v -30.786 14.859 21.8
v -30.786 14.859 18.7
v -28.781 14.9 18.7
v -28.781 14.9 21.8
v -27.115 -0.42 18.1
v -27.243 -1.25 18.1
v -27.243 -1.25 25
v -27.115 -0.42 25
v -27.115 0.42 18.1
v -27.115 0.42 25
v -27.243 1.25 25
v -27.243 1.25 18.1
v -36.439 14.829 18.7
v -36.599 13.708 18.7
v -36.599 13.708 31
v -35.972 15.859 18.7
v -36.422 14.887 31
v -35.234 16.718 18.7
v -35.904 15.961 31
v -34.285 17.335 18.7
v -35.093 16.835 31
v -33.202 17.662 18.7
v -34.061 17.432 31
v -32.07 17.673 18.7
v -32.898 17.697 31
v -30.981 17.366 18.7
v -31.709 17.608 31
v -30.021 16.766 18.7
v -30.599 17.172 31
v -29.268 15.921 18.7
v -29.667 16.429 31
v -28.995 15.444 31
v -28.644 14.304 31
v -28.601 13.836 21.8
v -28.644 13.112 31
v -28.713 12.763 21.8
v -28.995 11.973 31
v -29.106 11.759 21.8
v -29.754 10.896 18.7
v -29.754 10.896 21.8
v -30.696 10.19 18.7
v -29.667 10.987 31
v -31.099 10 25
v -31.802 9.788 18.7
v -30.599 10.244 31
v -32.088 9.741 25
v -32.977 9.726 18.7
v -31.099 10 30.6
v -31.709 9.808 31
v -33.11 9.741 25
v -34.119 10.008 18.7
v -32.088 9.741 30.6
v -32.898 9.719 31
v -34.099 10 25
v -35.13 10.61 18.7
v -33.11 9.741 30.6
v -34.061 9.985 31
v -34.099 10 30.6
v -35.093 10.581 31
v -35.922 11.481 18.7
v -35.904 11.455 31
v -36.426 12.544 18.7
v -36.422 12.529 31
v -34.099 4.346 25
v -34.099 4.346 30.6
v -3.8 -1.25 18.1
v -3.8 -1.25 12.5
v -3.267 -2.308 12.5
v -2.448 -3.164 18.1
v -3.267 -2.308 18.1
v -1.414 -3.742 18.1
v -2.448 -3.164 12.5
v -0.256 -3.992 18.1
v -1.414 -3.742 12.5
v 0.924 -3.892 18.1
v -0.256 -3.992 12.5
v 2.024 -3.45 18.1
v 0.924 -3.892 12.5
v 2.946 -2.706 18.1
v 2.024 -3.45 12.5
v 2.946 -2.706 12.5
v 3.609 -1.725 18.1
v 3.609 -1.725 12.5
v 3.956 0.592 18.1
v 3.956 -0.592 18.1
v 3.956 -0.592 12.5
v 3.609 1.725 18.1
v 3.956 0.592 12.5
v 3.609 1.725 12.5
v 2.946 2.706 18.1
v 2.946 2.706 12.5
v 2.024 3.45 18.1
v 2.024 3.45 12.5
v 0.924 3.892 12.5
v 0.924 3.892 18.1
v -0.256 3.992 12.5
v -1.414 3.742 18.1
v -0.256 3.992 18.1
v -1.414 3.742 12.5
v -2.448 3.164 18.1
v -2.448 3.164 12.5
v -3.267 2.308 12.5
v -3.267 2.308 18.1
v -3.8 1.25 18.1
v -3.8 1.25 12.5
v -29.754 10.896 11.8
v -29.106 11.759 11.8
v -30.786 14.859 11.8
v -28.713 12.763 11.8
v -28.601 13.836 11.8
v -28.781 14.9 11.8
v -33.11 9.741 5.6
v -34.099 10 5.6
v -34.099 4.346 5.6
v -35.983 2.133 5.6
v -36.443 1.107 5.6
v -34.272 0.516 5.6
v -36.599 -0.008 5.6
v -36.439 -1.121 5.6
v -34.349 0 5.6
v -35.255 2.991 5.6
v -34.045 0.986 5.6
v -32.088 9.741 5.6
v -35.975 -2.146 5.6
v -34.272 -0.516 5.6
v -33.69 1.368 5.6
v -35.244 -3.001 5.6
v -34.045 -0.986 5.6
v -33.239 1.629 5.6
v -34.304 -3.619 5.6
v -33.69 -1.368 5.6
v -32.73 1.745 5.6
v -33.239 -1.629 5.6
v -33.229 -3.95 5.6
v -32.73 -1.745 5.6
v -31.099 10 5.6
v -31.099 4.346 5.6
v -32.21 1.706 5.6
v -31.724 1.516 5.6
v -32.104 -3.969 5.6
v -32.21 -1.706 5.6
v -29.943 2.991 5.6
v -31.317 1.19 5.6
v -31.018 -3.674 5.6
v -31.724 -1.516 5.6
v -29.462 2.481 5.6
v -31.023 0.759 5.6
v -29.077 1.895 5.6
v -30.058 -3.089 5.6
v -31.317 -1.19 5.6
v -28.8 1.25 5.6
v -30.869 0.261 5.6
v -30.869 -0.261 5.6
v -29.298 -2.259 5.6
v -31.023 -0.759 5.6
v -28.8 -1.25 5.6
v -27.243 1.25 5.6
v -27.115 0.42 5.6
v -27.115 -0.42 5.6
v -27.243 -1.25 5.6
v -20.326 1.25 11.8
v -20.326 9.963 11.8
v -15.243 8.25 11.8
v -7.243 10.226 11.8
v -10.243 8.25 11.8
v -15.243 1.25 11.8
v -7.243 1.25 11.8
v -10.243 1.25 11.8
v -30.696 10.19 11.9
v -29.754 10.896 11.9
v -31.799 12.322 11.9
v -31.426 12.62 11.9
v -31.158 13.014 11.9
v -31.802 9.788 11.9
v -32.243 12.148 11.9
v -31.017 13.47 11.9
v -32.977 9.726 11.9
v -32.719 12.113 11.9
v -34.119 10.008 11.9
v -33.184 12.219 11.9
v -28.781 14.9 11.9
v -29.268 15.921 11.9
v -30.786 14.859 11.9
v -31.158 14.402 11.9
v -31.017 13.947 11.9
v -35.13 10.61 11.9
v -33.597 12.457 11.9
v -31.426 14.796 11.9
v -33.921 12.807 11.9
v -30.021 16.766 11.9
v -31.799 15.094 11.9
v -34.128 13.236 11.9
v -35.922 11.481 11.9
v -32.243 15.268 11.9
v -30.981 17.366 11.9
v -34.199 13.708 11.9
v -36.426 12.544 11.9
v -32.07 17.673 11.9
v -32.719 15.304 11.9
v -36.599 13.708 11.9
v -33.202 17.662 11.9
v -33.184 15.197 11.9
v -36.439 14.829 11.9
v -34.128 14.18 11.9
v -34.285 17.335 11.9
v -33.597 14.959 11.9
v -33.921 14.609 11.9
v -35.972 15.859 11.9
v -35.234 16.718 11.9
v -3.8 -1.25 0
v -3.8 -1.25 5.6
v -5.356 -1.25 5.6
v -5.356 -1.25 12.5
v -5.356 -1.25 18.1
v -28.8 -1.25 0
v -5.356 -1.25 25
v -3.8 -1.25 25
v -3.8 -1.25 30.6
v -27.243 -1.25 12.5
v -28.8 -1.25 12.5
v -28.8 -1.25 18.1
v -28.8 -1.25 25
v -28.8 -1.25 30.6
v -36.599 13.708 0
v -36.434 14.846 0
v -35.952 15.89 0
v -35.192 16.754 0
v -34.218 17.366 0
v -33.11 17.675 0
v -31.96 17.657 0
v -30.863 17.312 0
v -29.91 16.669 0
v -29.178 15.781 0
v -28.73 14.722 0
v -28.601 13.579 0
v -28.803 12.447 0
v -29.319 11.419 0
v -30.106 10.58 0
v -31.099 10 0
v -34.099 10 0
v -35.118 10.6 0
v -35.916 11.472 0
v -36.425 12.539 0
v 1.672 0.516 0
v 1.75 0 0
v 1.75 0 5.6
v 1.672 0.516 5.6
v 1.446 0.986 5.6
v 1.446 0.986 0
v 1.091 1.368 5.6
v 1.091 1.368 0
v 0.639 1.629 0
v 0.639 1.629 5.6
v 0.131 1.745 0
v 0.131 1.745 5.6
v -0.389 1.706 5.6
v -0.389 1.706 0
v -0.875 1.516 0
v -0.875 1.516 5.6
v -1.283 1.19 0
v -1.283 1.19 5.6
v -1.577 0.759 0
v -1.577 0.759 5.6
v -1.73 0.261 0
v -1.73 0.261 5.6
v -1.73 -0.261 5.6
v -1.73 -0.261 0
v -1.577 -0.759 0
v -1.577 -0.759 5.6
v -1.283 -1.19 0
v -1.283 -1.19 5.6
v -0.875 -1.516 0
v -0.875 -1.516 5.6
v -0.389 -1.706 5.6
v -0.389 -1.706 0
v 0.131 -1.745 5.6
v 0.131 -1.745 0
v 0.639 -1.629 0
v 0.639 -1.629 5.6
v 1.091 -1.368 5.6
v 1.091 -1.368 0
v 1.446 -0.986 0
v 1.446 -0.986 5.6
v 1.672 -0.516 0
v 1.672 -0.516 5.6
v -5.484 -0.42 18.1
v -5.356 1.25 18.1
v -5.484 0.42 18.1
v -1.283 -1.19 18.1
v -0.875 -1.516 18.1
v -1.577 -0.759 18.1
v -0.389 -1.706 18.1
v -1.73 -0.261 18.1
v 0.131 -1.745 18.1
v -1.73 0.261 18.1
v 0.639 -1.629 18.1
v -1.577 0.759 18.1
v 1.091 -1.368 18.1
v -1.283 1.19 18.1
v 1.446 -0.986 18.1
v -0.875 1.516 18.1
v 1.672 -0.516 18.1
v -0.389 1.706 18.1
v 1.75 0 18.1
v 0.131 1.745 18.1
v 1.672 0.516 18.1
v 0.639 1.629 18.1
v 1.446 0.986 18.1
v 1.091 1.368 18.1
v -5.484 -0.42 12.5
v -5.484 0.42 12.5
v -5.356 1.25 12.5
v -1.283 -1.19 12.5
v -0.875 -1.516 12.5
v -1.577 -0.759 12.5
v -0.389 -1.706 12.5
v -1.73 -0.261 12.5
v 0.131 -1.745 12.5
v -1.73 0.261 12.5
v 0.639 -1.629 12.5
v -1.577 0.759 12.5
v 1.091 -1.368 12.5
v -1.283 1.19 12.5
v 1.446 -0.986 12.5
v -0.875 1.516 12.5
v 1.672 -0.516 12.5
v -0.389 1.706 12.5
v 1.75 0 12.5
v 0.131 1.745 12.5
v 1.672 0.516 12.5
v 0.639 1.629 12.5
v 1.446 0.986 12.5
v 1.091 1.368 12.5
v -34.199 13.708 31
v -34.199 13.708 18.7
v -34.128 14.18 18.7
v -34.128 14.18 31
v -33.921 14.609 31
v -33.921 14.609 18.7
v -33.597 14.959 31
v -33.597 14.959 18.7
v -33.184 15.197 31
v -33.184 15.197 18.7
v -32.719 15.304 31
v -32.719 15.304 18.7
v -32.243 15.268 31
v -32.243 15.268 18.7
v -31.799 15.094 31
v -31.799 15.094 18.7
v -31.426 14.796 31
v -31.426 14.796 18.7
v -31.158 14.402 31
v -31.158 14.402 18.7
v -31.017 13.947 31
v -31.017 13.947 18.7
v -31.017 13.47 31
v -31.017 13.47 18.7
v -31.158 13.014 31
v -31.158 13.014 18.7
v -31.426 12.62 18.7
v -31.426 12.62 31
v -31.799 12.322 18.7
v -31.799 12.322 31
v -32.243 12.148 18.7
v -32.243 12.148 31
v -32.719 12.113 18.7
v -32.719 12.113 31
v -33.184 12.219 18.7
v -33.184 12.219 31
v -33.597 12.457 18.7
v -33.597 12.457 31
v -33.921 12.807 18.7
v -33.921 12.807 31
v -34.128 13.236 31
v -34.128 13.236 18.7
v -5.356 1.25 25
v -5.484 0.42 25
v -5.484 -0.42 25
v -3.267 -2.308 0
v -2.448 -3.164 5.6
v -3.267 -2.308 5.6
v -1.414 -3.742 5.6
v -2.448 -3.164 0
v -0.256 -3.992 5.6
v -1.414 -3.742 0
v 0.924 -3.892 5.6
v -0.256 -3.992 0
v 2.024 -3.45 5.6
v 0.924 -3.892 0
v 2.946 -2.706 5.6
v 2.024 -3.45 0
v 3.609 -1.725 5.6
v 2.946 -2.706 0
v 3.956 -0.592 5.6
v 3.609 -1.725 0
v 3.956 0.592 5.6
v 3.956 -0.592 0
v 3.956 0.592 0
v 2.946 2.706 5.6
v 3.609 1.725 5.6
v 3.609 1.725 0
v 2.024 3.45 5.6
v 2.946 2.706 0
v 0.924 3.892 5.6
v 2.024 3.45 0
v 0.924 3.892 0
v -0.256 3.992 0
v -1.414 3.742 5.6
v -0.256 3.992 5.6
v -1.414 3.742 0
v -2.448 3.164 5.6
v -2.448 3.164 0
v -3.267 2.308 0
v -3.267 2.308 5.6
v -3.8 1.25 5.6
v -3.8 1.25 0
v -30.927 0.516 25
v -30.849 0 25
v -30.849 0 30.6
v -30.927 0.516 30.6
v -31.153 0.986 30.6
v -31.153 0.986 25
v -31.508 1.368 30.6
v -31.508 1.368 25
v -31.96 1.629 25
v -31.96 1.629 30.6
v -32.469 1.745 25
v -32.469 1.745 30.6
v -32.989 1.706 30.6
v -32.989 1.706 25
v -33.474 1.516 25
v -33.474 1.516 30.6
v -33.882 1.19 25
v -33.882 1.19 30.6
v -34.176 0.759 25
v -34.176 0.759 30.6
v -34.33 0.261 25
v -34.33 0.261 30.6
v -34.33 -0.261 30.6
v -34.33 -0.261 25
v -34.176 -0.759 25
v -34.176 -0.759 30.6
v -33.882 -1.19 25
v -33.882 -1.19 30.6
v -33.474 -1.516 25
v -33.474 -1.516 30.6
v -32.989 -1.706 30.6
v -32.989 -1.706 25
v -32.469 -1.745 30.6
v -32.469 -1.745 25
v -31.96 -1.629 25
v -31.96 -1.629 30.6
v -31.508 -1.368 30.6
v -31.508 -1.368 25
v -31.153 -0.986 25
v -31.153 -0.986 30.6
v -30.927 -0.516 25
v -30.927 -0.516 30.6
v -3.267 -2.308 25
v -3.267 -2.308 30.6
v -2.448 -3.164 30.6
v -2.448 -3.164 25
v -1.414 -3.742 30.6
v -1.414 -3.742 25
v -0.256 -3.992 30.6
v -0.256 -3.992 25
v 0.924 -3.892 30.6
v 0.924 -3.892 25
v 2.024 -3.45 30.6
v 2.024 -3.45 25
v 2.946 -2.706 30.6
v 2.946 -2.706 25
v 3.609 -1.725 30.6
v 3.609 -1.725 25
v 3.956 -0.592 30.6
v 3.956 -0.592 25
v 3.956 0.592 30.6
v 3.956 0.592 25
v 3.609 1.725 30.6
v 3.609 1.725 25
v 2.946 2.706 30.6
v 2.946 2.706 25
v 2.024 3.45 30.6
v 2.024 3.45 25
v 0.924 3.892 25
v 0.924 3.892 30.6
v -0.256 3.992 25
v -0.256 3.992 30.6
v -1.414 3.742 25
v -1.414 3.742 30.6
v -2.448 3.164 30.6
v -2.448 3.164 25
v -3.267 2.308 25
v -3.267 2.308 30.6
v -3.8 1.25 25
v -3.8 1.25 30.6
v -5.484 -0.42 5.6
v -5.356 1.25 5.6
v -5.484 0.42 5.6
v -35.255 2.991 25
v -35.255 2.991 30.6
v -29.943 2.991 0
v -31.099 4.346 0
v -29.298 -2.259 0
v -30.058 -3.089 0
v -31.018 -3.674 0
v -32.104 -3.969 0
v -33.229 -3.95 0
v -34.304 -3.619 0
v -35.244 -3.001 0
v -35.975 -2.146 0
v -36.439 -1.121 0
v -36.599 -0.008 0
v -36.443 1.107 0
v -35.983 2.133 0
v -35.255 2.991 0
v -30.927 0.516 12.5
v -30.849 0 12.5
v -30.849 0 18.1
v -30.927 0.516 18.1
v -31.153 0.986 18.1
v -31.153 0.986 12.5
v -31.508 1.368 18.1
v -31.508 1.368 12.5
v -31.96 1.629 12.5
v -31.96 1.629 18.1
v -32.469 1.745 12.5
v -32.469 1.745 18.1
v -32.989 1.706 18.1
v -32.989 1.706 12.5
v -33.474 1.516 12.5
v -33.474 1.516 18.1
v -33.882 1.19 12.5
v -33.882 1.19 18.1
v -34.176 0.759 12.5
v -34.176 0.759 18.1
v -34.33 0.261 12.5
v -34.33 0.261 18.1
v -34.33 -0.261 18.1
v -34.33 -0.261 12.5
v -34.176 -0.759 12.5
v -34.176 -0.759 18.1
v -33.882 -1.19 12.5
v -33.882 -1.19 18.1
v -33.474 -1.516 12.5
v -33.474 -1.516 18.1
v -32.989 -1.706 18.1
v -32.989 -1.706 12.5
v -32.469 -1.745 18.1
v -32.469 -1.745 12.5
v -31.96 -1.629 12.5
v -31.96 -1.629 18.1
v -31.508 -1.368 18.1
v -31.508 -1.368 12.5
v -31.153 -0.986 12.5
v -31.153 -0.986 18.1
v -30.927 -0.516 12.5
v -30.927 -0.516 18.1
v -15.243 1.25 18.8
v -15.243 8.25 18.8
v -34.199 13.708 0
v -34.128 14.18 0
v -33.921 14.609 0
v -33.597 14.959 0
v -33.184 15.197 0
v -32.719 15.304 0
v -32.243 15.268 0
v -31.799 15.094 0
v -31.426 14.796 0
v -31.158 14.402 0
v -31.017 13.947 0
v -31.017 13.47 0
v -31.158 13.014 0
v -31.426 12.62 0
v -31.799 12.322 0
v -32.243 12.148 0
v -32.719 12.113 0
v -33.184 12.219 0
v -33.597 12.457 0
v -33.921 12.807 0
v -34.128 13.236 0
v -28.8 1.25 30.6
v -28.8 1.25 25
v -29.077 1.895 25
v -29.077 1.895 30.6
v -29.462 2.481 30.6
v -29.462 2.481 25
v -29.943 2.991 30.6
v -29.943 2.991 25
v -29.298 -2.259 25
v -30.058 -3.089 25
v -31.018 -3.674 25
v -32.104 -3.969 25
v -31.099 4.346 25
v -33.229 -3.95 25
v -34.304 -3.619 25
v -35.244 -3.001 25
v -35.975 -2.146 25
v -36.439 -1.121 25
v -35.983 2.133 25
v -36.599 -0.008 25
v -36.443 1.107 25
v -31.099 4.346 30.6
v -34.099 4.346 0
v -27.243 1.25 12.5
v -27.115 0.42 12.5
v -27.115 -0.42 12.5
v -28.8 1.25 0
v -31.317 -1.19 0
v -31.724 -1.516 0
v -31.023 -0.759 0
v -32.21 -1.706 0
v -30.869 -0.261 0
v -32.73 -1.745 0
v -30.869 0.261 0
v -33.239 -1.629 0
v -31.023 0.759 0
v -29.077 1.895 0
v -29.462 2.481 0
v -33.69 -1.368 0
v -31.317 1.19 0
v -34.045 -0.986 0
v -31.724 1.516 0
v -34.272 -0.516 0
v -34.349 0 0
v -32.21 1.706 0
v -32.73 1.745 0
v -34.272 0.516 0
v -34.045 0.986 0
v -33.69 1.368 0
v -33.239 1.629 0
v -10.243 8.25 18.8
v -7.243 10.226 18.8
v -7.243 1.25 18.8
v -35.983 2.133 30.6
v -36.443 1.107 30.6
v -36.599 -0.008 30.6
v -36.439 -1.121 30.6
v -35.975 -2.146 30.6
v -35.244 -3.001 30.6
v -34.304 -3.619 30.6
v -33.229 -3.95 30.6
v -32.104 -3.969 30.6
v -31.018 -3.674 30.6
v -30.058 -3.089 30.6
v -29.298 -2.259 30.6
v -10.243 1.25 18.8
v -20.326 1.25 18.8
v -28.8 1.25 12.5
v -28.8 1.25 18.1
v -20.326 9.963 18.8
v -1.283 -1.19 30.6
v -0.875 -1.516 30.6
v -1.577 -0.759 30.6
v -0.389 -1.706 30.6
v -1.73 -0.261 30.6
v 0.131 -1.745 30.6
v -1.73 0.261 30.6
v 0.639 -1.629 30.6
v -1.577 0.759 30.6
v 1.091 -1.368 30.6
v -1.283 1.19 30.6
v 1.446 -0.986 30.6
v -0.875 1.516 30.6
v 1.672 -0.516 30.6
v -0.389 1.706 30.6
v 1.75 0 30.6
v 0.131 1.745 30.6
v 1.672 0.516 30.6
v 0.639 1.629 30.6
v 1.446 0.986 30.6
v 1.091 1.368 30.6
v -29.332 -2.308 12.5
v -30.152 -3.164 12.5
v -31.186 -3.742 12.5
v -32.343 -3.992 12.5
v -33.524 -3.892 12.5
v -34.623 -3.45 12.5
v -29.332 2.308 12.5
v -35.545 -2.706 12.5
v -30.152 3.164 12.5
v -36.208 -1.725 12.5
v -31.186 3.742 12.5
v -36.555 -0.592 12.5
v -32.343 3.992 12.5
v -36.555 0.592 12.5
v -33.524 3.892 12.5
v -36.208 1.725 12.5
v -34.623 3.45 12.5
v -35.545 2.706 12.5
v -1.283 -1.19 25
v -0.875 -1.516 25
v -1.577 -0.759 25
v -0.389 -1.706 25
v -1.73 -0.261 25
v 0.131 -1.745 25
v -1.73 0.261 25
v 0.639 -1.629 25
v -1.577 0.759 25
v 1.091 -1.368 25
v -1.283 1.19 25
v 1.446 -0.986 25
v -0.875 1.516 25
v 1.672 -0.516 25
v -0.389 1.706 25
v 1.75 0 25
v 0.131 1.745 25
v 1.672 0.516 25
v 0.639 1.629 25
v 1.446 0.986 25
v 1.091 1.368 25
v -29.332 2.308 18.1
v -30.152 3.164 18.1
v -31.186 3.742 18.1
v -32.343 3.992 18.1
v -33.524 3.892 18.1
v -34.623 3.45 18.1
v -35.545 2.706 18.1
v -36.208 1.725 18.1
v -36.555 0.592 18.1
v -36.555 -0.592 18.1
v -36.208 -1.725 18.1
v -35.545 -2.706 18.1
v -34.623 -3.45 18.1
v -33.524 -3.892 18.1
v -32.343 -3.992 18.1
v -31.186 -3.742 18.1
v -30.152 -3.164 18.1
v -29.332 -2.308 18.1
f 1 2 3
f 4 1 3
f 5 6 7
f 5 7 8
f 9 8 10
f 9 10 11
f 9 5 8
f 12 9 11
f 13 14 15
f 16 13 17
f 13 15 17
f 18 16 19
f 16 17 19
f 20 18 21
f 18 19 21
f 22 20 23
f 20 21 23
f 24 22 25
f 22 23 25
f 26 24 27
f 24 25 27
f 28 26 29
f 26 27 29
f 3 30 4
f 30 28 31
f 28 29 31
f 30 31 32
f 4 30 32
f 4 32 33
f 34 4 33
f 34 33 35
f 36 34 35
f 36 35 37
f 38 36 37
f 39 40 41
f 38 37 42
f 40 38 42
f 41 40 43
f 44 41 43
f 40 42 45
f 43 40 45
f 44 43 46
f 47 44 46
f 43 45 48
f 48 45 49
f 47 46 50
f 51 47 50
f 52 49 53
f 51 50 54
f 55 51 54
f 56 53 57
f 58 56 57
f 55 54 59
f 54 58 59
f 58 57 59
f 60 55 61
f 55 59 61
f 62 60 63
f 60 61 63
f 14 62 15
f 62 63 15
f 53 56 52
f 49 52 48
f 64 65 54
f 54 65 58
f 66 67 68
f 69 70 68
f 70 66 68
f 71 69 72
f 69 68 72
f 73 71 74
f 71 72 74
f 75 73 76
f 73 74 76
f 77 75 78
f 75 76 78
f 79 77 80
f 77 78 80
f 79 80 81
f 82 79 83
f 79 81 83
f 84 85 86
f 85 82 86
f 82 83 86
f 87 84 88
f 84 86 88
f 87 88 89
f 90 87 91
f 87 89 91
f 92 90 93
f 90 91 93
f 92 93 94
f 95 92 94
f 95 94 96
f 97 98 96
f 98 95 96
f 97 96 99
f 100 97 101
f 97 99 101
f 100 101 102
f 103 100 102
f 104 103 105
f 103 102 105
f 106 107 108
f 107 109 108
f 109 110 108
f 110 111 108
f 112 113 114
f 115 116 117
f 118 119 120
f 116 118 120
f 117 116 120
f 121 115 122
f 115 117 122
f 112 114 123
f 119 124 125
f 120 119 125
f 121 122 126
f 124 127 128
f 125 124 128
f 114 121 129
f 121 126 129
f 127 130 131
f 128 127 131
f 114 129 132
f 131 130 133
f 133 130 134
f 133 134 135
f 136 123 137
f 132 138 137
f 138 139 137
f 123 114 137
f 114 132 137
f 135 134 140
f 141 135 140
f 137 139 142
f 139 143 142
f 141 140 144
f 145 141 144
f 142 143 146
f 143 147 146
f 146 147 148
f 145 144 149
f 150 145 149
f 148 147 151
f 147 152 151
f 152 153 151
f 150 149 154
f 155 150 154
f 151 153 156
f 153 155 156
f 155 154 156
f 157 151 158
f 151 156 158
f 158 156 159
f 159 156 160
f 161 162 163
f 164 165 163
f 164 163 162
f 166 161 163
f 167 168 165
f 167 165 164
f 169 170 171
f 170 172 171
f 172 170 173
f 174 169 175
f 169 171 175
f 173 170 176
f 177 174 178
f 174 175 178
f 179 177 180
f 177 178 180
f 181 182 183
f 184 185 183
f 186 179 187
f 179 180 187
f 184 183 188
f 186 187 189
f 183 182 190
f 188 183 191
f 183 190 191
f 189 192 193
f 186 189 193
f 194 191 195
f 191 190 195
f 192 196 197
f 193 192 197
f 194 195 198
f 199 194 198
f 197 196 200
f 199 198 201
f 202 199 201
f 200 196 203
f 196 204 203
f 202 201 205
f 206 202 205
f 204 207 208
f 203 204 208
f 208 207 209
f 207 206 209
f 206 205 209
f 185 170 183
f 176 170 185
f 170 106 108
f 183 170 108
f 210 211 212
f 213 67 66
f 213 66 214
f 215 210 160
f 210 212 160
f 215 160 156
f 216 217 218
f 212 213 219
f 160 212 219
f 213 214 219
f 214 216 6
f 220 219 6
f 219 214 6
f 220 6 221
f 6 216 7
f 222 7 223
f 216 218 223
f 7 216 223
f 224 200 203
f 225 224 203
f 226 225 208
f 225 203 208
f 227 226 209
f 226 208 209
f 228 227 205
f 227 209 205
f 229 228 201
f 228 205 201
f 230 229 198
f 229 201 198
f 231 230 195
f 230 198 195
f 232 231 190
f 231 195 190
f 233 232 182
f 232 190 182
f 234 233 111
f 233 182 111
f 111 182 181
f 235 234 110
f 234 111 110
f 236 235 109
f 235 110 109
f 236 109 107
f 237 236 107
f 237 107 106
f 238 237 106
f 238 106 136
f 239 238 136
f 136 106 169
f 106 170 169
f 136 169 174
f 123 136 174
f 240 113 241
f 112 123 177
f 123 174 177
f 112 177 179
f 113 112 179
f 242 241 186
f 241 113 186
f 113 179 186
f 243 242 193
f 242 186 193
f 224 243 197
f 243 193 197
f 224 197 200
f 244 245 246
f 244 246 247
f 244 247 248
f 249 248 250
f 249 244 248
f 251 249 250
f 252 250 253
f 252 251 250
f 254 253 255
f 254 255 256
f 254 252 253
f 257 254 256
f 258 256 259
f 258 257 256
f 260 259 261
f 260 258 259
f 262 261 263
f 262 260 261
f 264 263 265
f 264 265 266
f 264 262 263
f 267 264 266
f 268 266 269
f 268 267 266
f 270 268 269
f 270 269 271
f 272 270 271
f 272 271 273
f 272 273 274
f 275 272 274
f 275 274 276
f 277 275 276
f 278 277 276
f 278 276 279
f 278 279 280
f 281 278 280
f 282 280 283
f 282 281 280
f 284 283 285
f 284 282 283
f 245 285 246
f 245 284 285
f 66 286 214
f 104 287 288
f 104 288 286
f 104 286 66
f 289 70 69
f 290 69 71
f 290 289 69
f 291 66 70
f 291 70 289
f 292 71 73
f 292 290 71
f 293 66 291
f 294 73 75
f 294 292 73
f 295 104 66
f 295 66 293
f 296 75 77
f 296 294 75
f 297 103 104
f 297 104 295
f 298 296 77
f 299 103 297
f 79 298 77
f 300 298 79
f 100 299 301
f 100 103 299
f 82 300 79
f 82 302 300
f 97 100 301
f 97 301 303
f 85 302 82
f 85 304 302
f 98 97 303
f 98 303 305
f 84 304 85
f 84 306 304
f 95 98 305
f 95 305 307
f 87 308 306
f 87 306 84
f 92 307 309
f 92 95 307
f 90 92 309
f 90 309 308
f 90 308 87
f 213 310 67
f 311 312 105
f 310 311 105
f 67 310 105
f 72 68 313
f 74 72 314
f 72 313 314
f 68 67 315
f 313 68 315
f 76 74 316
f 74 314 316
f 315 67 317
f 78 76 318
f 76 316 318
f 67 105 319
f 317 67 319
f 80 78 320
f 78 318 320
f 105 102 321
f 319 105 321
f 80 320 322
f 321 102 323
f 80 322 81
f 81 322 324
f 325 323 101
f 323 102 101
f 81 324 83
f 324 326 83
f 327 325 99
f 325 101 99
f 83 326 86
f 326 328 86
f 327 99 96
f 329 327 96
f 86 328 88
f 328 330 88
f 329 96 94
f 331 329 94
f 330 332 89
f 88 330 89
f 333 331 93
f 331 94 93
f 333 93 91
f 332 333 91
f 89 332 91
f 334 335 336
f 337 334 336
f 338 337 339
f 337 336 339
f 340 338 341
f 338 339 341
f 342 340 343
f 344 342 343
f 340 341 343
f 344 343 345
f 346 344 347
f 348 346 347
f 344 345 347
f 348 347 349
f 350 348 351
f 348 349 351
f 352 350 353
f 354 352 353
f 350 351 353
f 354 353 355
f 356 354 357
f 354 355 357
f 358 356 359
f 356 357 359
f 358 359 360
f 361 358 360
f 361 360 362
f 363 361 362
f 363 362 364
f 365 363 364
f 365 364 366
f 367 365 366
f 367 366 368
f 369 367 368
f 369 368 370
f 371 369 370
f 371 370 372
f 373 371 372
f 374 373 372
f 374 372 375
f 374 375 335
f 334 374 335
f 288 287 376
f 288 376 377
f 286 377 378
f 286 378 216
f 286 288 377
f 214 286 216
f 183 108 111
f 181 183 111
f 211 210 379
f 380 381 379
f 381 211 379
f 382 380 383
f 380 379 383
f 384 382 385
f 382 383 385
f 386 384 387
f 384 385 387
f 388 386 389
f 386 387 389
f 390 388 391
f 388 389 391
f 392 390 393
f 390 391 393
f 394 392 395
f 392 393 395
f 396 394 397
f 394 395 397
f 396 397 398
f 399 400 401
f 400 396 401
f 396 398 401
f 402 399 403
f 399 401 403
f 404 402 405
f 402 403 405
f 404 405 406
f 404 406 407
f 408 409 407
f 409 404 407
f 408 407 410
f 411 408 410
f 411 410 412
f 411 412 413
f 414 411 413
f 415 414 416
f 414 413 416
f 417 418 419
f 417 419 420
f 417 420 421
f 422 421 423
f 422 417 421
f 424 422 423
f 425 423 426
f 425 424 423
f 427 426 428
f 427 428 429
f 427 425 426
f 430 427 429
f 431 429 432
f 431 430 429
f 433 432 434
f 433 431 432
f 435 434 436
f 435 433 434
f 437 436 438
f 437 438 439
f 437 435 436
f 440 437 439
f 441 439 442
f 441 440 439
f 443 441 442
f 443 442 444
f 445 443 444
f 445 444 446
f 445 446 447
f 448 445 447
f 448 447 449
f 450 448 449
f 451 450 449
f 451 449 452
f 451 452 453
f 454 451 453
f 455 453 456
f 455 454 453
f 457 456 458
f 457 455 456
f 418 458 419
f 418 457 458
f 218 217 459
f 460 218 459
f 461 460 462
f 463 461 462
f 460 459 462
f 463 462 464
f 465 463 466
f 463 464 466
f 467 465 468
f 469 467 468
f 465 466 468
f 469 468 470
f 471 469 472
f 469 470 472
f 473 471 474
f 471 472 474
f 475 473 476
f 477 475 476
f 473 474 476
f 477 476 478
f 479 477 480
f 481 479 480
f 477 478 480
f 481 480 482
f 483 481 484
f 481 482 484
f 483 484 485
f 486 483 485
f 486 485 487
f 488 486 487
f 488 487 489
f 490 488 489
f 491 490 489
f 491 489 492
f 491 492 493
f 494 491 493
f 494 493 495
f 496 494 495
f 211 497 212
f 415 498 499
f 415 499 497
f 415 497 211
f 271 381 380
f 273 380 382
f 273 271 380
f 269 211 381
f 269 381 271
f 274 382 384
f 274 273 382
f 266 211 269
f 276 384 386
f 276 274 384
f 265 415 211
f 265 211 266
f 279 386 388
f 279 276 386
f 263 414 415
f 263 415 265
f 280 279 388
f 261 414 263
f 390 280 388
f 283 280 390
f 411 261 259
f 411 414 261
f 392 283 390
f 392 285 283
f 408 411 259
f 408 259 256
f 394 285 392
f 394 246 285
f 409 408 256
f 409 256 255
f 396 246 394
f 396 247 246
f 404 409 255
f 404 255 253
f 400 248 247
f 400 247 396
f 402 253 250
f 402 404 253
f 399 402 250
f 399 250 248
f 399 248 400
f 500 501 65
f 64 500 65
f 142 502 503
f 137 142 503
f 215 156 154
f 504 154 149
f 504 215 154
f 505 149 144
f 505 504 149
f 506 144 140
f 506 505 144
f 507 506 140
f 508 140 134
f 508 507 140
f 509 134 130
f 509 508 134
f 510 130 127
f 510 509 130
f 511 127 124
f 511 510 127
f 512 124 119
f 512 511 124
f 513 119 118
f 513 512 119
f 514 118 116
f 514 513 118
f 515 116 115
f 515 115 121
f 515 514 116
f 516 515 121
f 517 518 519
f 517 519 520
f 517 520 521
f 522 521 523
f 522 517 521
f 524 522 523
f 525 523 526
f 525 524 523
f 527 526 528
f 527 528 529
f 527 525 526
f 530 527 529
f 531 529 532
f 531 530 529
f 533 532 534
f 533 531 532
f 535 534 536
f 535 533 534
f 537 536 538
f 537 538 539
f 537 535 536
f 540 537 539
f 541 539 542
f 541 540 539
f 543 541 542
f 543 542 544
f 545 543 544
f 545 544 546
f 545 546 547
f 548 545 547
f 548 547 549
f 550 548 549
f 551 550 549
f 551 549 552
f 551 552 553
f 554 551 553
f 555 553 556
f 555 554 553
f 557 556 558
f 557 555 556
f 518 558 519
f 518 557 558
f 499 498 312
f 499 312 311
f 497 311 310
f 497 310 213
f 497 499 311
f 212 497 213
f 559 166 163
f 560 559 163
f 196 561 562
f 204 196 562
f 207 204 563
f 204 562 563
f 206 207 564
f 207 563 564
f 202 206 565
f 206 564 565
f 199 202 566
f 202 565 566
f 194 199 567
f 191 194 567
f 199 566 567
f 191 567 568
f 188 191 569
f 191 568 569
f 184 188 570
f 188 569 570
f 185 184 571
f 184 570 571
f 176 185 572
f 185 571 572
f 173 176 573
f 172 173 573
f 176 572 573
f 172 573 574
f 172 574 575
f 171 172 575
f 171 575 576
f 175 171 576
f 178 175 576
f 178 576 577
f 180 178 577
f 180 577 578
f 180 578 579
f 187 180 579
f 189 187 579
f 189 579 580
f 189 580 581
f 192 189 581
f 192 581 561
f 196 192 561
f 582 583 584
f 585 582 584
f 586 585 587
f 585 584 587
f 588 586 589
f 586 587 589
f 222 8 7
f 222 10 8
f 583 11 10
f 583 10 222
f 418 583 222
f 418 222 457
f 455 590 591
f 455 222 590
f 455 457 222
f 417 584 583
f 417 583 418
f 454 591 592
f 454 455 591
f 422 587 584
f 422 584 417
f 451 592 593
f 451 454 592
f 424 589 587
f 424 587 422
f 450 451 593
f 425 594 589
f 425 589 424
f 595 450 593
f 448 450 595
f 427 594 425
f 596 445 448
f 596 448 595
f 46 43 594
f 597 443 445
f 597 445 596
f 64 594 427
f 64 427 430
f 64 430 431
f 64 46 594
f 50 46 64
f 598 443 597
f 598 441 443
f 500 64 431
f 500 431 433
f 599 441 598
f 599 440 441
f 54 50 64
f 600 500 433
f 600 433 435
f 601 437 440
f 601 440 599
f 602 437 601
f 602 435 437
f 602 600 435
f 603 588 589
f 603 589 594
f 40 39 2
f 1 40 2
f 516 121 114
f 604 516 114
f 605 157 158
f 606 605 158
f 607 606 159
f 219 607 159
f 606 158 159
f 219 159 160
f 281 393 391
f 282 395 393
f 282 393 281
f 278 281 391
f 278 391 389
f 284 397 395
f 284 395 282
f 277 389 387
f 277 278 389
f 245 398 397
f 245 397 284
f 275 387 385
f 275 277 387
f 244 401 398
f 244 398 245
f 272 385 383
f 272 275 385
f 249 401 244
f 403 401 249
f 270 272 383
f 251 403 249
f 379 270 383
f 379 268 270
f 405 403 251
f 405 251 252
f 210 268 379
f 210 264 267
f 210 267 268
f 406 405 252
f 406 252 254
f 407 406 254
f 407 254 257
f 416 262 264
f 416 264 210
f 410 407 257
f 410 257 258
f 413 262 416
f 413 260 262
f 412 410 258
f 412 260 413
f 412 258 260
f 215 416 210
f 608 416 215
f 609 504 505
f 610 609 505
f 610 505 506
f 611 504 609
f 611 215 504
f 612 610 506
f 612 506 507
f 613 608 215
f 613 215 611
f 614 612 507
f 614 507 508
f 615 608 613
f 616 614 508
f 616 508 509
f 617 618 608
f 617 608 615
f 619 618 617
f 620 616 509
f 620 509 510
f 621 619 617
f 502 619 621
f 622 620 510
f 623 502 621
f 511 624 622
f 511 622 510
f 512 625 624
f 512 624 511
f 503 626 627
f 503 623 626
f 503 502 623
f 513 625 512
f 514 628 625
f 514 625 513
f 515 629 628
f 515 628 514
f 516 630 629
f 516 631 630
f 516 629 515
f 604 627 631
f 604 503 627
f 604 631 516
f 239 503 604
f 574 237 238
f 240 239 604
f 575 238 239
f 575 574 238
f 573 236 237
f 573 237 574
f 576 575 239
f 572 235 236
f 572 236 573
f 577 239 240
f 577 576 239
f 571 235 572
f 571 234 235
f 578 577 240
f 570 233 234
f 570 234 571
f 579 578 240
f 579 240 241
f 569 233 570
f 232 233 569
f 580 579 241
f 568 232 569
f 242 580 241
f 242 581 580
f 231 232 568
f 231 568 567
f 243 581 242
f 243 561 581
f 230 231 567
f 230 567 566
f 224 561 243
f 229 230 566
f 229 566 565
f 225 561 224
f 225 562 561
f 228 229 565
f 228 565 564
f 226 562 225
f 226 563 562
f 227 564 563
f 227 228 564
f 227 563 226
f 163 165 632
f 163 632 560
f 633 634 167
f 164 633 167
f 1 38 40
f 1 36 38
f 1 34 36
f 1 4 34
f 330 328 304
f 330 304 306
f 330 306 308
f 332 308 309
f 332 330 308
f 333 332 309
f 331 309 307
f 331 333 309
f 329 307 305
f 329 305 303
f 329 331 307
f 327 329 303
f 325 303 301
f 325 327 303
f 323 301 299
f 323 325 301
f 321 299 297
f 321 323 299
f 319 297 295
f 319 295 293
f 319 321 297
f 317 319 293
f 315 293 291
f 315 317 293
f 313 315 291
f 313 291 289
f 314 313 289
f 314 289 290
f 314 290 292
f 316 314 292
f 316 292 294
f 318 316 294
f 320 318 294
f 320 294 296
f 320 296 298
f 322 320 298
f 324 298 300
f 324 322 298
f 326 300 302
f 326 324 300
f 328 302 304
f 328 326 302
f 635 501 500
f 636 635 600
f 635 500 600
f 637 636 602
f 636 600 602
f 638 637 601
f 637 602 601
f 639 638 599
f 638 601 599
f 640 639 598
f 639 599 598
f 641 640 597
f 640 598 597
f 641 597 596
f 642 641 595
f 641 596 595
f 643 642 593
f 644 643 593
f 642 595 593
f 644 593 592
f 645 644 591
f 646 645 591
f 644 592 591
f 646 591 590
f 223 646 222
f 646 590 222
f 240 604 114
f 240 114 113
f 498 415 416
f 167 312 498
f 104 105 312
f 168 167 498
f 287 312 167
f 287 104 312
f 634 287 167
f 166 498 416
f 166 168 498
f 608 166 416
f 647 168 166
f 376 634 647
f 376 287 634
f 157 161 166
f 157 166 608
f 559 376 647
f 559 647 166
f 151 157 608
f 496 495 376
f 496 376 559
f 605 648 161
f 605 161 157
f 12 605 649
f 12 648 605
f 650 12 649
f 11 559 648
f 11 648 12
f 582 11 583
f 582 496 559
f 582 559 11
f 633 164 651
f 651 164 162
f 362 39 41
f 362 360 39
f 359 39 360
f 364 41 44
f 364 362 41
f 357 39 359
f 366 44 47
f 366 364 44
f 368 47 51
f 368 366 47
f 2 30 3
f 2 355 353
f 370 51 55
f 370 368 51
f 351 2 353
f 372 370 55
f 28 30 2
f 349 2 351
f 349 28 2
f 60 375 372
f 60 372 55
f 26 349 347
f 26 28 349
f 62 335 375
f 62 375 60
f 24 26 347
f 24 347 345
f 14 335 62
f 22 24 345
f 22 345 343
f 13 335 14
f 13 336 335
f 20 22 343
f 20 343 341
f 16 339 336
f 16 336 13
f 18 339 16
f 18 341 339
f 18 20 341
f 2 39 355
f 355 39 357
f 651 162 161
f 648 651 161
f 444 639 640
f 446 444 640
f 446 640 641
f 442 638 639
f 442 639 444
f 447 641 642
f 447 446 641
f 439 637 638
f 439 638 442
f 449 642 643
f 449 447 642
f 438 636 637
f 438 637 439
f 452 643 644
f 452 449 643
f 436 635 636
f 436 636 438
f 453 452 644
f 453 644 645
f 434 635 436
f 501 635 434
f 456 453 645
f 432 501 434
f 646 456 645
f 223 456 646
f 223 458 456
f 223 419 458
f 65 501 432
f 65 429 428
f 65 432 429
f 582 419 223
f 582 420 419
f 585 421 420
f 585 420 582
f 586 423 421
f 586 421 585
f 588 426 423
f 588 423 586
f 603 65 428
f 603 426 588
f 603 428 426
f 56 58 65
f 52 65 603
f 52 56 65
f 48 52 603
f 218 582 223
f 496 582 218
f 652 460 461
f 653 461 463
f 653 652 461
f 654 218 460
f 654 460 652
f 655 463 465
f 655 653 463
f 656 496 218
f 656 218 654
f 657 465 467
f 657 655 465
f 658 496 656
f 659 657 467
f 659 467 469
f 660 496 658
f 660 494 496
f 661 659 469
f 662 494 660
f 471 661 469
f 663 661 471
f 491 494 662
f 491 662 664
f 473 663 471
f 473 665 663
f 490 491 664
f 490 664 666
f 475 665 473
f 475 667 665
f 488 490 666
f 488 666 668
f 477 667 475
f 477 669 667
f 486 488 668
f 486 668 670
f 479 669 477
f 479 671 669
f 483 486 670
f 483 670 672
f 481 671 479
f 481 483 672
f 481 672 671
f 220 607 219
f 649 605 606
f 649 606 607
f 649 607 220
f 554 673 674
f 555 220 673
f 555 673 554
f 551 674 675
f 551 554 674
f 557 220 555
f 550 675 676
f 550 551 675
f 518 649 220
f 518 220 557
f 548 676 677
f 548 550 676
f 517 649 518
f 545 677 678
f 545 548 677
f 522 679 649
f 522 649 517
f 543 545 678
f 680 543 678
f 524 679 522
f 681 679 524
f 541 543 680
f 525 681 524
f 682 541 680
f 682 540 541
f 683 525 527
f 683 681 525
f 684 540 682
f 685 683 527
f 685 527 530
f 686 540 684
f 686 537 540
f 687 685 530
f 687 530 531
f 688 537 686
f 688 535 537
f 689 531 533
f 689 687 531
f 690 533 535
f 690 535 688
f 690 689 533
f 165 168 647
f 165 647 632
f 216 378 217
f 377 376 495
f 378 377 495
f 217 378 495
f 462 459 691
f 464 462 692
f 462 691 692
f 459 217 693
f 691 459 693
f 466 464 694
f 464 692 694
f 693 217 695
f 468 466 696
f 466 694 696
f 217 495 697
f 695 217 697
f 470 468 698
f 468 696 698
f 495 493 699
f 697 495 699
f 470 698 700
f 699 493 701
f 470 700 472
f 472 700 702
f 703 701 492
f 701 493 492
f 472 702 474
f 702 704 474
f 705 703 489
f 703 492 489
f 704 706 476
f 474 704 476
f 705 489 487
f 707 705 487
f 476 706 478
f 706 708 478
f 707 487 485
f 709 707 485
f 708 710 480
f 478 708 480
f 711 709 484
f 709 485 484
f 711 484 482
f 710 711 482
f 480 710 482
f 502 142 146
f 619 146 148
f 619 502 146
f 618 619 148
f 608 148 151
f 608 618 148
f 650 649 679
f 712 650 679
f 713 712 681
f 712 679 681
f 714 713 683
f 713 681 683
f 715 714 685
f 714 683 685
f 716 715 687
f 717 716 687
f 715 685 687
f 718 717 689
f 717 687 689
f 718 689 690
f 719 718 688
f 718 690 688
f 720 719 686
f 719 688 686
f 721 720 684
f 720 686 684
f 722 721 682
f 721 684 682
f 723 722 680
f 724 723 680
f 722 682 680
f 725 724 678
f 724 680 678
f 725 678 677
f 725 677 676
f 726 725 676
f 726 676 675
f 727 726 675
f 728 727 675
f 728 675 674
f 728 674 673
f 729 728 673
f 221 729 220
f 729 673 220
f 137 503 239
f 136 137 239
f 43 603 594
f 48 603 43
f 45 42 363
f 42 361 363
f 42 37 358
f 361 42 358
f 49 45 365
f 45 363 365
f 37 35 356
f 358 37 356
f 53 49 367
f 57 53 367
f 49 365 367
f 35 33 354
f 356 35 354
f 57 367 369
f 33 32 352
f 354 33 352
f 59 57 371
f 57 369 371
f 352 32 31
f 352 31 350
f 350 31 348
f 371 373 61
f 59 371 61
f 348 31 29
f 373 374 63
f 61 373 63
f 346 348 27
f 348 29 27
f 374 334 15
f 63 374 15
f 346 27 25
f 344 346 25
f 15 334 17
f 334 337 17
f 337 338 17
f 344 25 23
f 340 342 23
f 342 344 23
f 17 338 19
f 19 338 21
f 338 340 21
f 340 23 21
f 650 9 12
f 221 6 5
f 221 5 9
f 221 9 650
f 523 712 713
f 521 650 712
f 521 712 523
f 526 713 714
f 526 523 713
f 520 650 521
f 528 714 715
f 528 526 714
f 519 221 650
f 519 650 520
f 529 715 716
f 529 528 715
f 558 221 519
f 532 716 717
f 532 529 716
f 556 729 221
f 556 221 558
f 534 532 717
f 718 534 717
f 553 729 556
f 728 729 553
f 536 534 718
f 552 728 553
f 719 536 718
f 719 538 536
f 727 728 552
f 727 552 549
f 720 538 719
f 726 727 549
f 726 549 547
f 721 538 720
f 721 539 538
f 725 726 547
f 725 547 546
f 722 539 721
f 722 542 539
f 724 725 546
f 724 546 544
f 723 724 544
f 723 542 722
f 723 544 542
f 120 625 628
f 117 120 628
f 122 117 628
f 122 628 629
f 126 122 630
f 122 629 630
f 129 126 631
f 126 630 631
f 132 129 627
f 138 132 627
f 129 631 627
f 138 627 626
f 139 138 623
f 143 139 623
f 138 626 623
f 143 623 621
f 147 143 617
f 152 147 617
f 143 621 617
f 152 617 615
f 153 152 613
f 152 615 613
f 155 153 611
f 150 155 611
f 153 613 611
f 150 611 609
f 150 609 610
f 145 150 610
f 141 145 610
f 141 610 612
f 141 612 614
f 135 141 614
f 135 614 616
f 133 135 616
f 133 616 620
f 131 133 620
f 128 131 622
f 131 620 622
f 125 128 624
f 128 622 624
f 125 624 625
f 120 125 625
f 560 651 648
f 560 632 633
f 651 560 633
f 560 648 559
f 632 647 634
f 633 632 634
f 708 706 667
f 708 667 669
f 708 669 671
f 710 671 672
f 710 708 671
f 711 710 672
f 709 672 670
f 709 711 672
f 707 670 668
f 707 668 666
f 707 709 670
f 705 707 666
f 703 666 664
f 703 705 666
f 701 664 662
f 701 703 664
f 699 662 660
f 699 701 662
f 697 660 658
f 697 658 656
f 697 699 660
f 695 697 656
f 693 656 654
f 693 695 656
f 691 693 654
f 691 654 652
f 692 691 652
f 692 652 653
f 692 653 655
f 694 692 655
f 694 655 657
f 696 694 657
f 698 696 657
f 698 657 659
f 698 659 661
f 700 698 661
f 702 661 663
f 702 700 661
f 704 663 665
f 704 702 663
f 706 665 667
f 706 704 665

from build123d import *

# Parameters (mm, degrees)
SKETCH_2_R                   = 4
SKETCH_2_R_2                 = 1.75
EXTRUDE_1_DEPTH              = 5.6
PATTERN_LINEAR_1_COUNT       = 3
PATTERN_LINEAR_1_PITCH       = 12.5
EXTRUDE_2_DEPTH              = 6.25
EXTRUDE_2_DEPTH_BACK         = 37.25
SKETCH_3_W                   = 25
SKETCH_3_H                   = 2.5
SKETCH_4_R                   = 5.5
CUT_EXTRUDE_1_DEPTH          = 6.9
PATTERN_LINEAR_2_COUNT       = 4
PATTERN_LINEAR_2_PITCH       = 12.5
PATTERN_LINEAR_4_COUNT       = 2
PATTERN_LINEAR_4_PITCH       = 12.5
PATTERN_START                = 12.5
PATTERN_LINEAR_3_OUTLINE_R   = 1.75
PATTERN_LINEAR_3_DEPTH       = 5.6
PATTERN_START_2              = 25
PATTERN_LINEAR_3_2_OUTLINE_R = 1.75
PATTERN_LINEAR_3_2_DEPTH     = 5.6
MIRROR_3_COPY_1_SKETCH_R     = 5.5
MIRROR_3_COPY_1_DEPTH        = 6.9
MIRROR_3_COPY_2_SKETCH_R     = 5.5
MIRROR_3_COPY_2_DEPTH        = 6.9
MIRROR_3_COPY_3_SKETCH_R     = 5.5
MIRROR_3_COPY_3_DEPTH        = 6.9
MIRROR_3_COPY_4_SKETCH_R     = 5.5
MIRROR_3_COPY_4_DEPTH        = 6.9
SKETCH_5_W                   = 3
SKETCH_5_H                   = 10
EXTRUDE_3_DEPTH              = 5.6
EXTRUDE_4_DEPTH              = 25
EXTRUDE_4_DEPTH_BACK         = 6
SKETCH_6_R                   = 4
SKETCH_7_W                   = 20
SKETCH_7_H                   = 7
EXTRUDE_5_DEPTH              = 10
SKETCH_8_W                   = 5
SKETCH_8_H                   = 7
CUT_EXTRUDE_2_DEPTH          = 10
SKETCH_12_W                  = 25.926545396
SKETCH_12_H                  = 6.65
SKETCH_12_W_2                = 26.106427018
SKETCH_12_H_2                = 6.25
CUT_EXTRUDE_5_DEPTH          = 10
CUT_EXTRUDE_6_DEPTH          = 3.4
CUT_EXTRUDE_6_DEPTH_BACK     = 3.4
SKETCH_13_R                  = 4
SKETCH_14_R                  = 1.6
CUT_EXTRUDE_7_DEPTH          = 56.2


# Read off the part's stored shape, not the designer's step: Линейный массив3
with BuildPart() as part:
    # Эскиз2 → Бобышка-Вытянуть1 (new body)
    with BuildSketch(Plane.XY):
        Circle(SKETCH_2_R)
        Circle(SKETCH_2_R_2, mode=Mode.SUBTRACT)
    extrude_1 = extrude(amount=EXTRUDE_1_DEPTH)


with BuildPart() as pattern_linear_1_1:
    # Линейный массив1: pattern copy
    add(part.part.moved(Location(Vector(0, 0, 1) * (1 * PATTERN_LINEAR_1_PITCH))))


with BuildPart() as pattern_linear_1_2:
    # Линейный массив1: pattern copy
    add(part.part.moved(Location(Vector(0, 0, 1) * (2 * PATTERN_LINEAR_1_PITCH))))


with BuildPart() as part_1:
    add(part.part)

    add(pattern_linear_1_1.part)  # Бобышка-Вытянуть2 merges Линейный массив1_1

    add(pattern_linear_1_2.part)  # Бобышка-Вытянуть2 merges Линейный массив1_2
    # Эскиз3 → Бобышка-Вытянуть2 (add, two sides: drawn at the far end of the back side and taken through both)
    with BuildSketch(Plane(origin=(0, 0, 0), x_dir=(-1, 0, 0), z_dir=(0, 0, -1)).offset(-EXTRUDE_2_DEPTH_BACK)):
        with Locations((16.299671038, 0)):
            Rectangle(SKETCH_3_W, SKETCH_3_H)
    extrude(amount=EXTRUDE_2_DEPTH + EXTRUDE_2_DEPTH_BACK)

    # Эскиз4 → Вырез-Вытянуть1 (cut)
    with BuildSketch(Plane.XY.offset(5.6)):
        Circle(SKETCH_4_R)
    cut_extrude_1 = extrude(amount=CUT_EXTRUDE_1_DEPTH, mode=Mode.SUBTRACT)

    # Линейный массив2: Вырез-Вытянуть1 ×4
    with Locations(*[(0, 0, i * PATTERN_LINEAR_2_PITCH) for i in range(1, PATTERN_LINEAR_2_COUNT)]):
        add(cut_extrude_1, mode=Mode.SUBTRACT)

    # Линейный массив4: Вырез-Вытянуть1 ×2
    with Locations(*[(0, 0, -i * PATTERN_LINEAR_4_PITCH) for i in range(1, PATTERN_LINEAR_4_COUNT)]):
        add(cut_extrude_1, mode=Mode.SUBTRACT)

    # Зеркальное отражение1: Бобышка-Вытянуть1 across plane
    add(extrude_1.mirror(Plane.ZY.offset(16.299671038)))

    # Линейный массив3 outline → Линейный массив3 (add)
    with BuildSketch(Plane.XY.offset(PATTERN_START)):
        with BuildLine():
            ThreePointArc((-28.799671038, 1.25), (-36.599342077, 0), (-28.799671038, -1.25))
            Line((-28.799671038, -1.25), (-28.799671038, 1.25))
        make_face()
        with Locations((-32.599342077, 0)):
            Circle(PATTERN_LINEAR_3_OUTLINE_R, mode=Mode.SUBTRACT)
    extrude(amount=PATTERN_LINEAR_3_DEPTH)

    # Pattern Linear 3 2 outline → Pattern Linear 3 2 (add)
    with BuildSketch(Plane.XY.offset(PATTERN_START_2)):
        with BuildLine():
            ThreePointArc((-28.799671038, 1.25), (-36.599342077, 0), (-28.799671038, -1.25))
            Line((-28.799671038, -1.25), (-28.799671038, 1.25))
        make_face()
        with Locations((-32.599342077, 0)):
            Circle(PATTERN_LINEAR_3_2_OUTLINE_R, mode=Mode.SUBTRACT)
    extrude(amount=PATTERN_LINEAR_3_2_DEPTH)

    # Зеркальное отражение3: Вырез-Вытянуть1 across plane
    add(cut_extrude_1.mirror(Plane.ZY.offset(16.299671038)), mode=Mode.SUBTRACT)

    # Зеркальное отражение3 copy 1 sketch → Зеркальное отражение3 copy 1 (cut)
    with BuildSketch(Plane(origin=(-32.599342077, 0, 18.1), x_dir=(-1, 0, 0), z_dir=(0, 0, 1))):
        Circle(MIRROR_3_COPY_1_SKETCH_R)
    extrude(amount=MIRROR_3_COPY_1_DEPTH, mode=Mode.SUBTRACT)

    # Зеркальное отражение3 copy 2 sketch → Зеркальное отражение3 copy 2 (cut)
    with BuildSketch(Plane(origin=(-32.599342077, 0, 30.6), x_dir=(-1, 0, 0), z_dir=(0, 0, 1))):
        Circle(MIRROR_3_COPY_2_SKETCH_R)
    extrude(amount=MIRROR_3_COPY_2_DEPTH, mode=Mode.SUBTRACT)

    # Зеркальное отражение3 copy 3 sketch → Зеркальное отражение3 copy 3 (cut)
    with BuildSketch(Plane(origin=(-32.599342077, 0, 43.1), x_dir=(-1, 0, 0), z_dir=(0, 0, 1))):
        Circle(MIRROR_3_COPY_3_SKETCH_R)
    extrude(amount=MIRROR_3_COPY_3_DEPTH, mode=Mode.SUBTRACT)

    # Зеркальное отражение3 copy 4 sketch → Зеркальное отражение3 copy 4 (cut)
    with BuildSketch(Plane(origin=(-32.599342077, 0, -6.9), x_dir=(-1, 0, 0), z_dir=(0, 0, 1))):
        Circle(MIRROR_3_COPY_4_SKETCH_R)
    extrude(amount=MIRROR_3_COPY_4_DEPTH, mode=Mode.SUBTRACT)

    # Эскиз5 → Бобышка-Вытянуть3 (add)
    with BuildSketch(Plane(origin=(0, 0, 0), x_dir=(-1, 0, 0), z_dir=(0, 0, -1))):
        with Locations((32.599342077, 8.708099244)):
            Rectangle(SKETCH_5_W, SKETCH_5_H)
    extrude_3 = extrude(amount=-EXTRUDE_3_DEPTH)

    # Зеркальное отражение4: Бобышка-Вытянуть3 across plane
    add(extrude_3.mirror(Plane(origin=(0, 0, 15.3), x_dir=(1, 0, 0), z_dir=(0, 0, -1))))

    # Эскиз6 → Бобышка-Вытянуть4 (add, two sides: drawn at the far end of the back side and taken through both)
    with BuildSketch(Plane(origin=(0, 0, 25), x_dir=(-1, 0, 0), z_dir=(0, 0, -1)).offset(-EXTRUDE_4_DEPTH_BACK)):
        with Locations((32.599342077, 13.708099244)):
            Circle(SKETCH_6_R)
    extrude(amount=EXTRUDE_4_DEPTH + EXTRUDE_4_DEPTH_BACK)

    # Эскиз7 → Бобышка-Вытянуть5 (add)
    with BuildSketch(Plane(origin=(0, 1.25, 0), x_dir=(1, 0, 0), z_dir=(0, 1, 0))):
        with Locations((-17.243270755, -15.3)):
            Rectangle(SKETCH_7_W, SKETCH_7_H)
    extrude(amount=EXTRUDE_5_DEPTH)

    # Эскиз8 → Вырез-Вытянуть2 (cut)
    with BuildSketch(Plane(origin=(0, 0, 11.8), x_dir=(-1, 0, 0), z_dir=(0, 0, -1))):
        Polygon((6.030917846, 10.25), (20.326387044, 9.963182504), (20.326387044, 1.25), (27.243270755, 1.25), (30.785730431, 14.859314756), (3.995086375, 15.396829498), align=None)
        with Locations((12.743270755, 4.75)):
            Rectangle(SKETCH_8_W, SKETCH_8_H)
    extrude(amount=-CUT_EXTRUDE_2_DEPTH, mode=Mode.SUBTRACT)

    # Эскиз12 → Вырез-Вытянуть5 (cut)
    with BuildSketch(Plane(origin=(0, 1.25, 0), x_dir=(1, 0, 0), z_dir=(0, 1, 0))):
        with Locations((-16.867780953, -33.925)):
            Rectangle(SKETCH_12_W, SKETCH_12_H)
        with Locations((-16.852884547, 3.125)):
            Rectangle(SKETCH_12_W_2, SKETCH_12_H_2)
    extrude(amount=-CUT_EXTRUDE_5_DEPTH, mode=Mode.SUBTRACT)

    # Эскиз13 → Вырез-Вытянуть6 (cut, two sides: drawn at the far end of the back side and taken through both)
    with BuildSketch(Plane(origin=(0, 0, 15.3), x_dir=(-1, 0, 0), z_dir=(0, 0, -1)).offset(-CUT_EXTRUDE_6_DEPTH_BACK)):
        with Locations((32.599342077, 13.708099244)):
            Circle(SKETCH_13_R)
    extrude(amount=CUT_EXTRUDE_6_DEPTH + CUT_EXTRUDE_6_DEPTH_BACK, mode=Mode.SUBTRACT)

    # Эскиз14 → Вырез-Вытянуть7 (cut)
    with BuildSketch(Plane(origin=(0, 0, 0), x_dir=(-1, 0, 0), z_dir=(0, 0, -1))):
        with Locations((32.599342077, 13.708099244)):
            Circle(SKETCH_14_R)
    extrude(amount=-CUT_EXTRUDE_7_DEPTH, mode=Mode.SUBTRACT)

    # Фаска1
    # the kernel refuses this chamfer: 1.81151278, 1 mm, written as the material it adds along each edge
    with BuildSketch(Plane(origin=(-31.099342077, 3.708099244, 0), x_dir=(0.8415361936638334, -0.540200735610187, 0), z_dir=(0, 0, 1))) as chamfer_1_piece_1:
        with BuildLine():
            Line((1.429397457, 0), (-0.413759333, 0.557495143))
            Line((-0.413759333, 0.557495143), (-0.444248404, 0.537923532))
            ThreePointArc((-0.444248404, 0.537923532), (-0.217578261, 0.271879907), (-0.030489071, -0.019571611))
            Line((-0.030489071, -0.019571611), (0.006709967, -0.03560348))
            ThreePointArc((0.006709967, -0.03560348), (0.714480275, 0.032881444), (1.423788773, -0.035793492))
            Line((1.423788773, -0.035793492), (1.429397457, 0))
        make_face()
    extrude(amount=5.6)
    with BuildSketch(Plane(origin=(-34.099342077, 3.708099244, 0), x_dir=(-0.8415361936638353, -0.5402007356101841, 0), z_dir=(0, 0, 1))) as chamfer_1_piece_2:
        with BuildLine():
            Line((1.429397457, 0), (-0.413759333, -0.557495143))
            Line((-0.413759333, -0.557495143), (-0.444248404, -0.537923532))
            ThreePointArc((-0.444248404, -0.537923532), (-0.217578261, -0.271879907), (-0.030489071, 0.019571611))
            Line((-0.030489071, 0.019571611), (0.006709967, 0.03560348))
            ThreePointArc((0.006709967, 0.03560348), (0.714480275, -0.032881444), (1.423788773, 0.035793492))
            Line((1.423788773, 0.035793492), (1.429397457, 0))
        make_face()
    extrude(amount=5.6)
    with BuildSketch(Plane(origin=(-31.099342077, 3.708099244, 30.6), x_dir=(0.8415361938100423, -0.5402007353824197, 0), z_dir=(0, 0, -1))) as chamfer_1_piece_3:
        with BuildLine():
            Line((1.429397457, 0), (-0.413759333, -0.557495144))
            Line((-0.413759333, -0.557495144), (-0.444248404, -0.537923533))
            ThreePointArc((-0.444248404, -0.537923533), (-0.217578261, -0.271879907), (-0.030489071, 0.019571611))
            Line((-0.030489071, 0.019571611), (0.006709967, 0.03560348))
            ThreePointArc((0.006709967, 0.03560348), (0.714480275, -0.032881444), (1.423788773, 0.035793492))
            Line((1.423788773, 0.035793492), (1.429397457, 0))
        make_face()
    extrude(amount=5.6)
    with BuildSketch(Plane(origin=(-34.099342077, 3.708099244, 30.6), x_dir=(-0.8415361937600511, -0.5402007354602969, 0), z_dir=(0, 0, -1))) as chamfer_1_piece_4:
        with BuildLine():
            Line((1.429397457, 0), (-0.413759333, 0.557495144))
            Line((-0.413759333, 0.557495144), (-0.444248404, 0.537923533))
            ThreePointArc((-0.444248404, 0.537923533), (-0.217578261, 0.271879907), (-0.030489071, -0.019571611))
            Line((-0.030489071, -0.019571611), (0.006709967, -0.03560348))
            ThreePointArc((0.006709967, -0.03560348), (0.714480275, 0.032881444), (1.423788773, -0.035793492))
            Line((1.423788773, -0.035793492), (1.429397457, 0))
        make_face()
    extrude(amount=5.6)


solid = part_1.part
